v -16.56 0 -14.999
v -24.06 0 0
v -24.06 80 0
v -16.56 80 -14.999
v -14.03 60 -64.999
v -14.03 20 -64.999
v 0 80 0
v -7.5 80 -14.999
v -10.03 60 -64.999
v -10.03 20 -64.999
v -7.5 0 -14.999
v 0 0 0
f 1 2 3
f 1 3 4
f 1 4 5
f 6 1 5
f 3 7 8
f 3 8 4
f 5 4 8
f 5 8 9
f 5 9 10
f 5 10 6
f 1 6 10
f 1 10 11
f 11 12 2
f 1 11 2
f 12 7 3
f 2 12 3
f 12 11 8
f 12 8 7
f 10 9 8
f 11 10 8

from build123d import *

# Parameters (mm, degrees)
BOSS_EXTRUDE1_DEPTH = 80
SKETCH2_W           = 9.06
SKETCH2_H           = 80
BOSS_EXTRUDE2_DEPTH = 50
CUT_EXTRUDE1_DEPTH  = 105.399039741
CUT_EXTRUDE2_DEPTH  = 106.848049103


with BuildPart() as part:
    # Sketch1 → Boss-Extrude1 (new body)
    with BuildSketch(Plane(origin=(0, 0, 0), x_dir=(1, 0, 0), z_dir=(0, 1, 0))):
        Polygon((-24.06, 0), (-16.56, 14.999429989), (-7.5, 14.999429989), (0, 0), align=None)
    extrude(amount=BOSS_EXTRUDE1_DEPTH)

    # Sketch2 → Boss-Extrude2 (add)
    with BuildSketch(Plane(origin=(0, 0, -14.999429989), x_dir=(-1, 0, 0), z_dir=(0, 0, -1))):
        with Locations((12.03, 40)):
            Rectangle(SKETCH2_W, SKETCH2_H)
    extrude(amount=BOSS_EXTRUDE2_DEPTH)

    # Sketch3 → Cut-Extrude1 (cut, through all)
    with BuildSketch(Plane.ZY.offset(16.56)):
        Polygon((-14.999429989, 80), (-64.999429989, 60), (-64.999429989, 80), align=None)
        Polygon((-64.999429989, 0), (-64.999429989, 20), (-14.999429989, 0), align=None)
    extrude(amount=-CUT_EXTRUDE1_DEPTH, mode=Mode.SUBTRACT)

    # Sketch7 → Cut-Extrude2 (cut, through all)
    with BuildSketch(Plane(origin=(0, 80, 0), x_dir=(1, 0, 0), z_dir=(0, 1, 0))):
        Polygon((-16.56, 14.999429989), (-14.03, 64.999429989), (-16.56, 64.999429989), align=None)
        Polygon((-7.5, 14.999429989), (-7.5, 64.999429989), (-10.03, 64.999429989), align=None)
    extrude(amount=-CUT_EXTRUDE2_DEPTH, mode=Mode.SUBTRACT)


solid = part.part
